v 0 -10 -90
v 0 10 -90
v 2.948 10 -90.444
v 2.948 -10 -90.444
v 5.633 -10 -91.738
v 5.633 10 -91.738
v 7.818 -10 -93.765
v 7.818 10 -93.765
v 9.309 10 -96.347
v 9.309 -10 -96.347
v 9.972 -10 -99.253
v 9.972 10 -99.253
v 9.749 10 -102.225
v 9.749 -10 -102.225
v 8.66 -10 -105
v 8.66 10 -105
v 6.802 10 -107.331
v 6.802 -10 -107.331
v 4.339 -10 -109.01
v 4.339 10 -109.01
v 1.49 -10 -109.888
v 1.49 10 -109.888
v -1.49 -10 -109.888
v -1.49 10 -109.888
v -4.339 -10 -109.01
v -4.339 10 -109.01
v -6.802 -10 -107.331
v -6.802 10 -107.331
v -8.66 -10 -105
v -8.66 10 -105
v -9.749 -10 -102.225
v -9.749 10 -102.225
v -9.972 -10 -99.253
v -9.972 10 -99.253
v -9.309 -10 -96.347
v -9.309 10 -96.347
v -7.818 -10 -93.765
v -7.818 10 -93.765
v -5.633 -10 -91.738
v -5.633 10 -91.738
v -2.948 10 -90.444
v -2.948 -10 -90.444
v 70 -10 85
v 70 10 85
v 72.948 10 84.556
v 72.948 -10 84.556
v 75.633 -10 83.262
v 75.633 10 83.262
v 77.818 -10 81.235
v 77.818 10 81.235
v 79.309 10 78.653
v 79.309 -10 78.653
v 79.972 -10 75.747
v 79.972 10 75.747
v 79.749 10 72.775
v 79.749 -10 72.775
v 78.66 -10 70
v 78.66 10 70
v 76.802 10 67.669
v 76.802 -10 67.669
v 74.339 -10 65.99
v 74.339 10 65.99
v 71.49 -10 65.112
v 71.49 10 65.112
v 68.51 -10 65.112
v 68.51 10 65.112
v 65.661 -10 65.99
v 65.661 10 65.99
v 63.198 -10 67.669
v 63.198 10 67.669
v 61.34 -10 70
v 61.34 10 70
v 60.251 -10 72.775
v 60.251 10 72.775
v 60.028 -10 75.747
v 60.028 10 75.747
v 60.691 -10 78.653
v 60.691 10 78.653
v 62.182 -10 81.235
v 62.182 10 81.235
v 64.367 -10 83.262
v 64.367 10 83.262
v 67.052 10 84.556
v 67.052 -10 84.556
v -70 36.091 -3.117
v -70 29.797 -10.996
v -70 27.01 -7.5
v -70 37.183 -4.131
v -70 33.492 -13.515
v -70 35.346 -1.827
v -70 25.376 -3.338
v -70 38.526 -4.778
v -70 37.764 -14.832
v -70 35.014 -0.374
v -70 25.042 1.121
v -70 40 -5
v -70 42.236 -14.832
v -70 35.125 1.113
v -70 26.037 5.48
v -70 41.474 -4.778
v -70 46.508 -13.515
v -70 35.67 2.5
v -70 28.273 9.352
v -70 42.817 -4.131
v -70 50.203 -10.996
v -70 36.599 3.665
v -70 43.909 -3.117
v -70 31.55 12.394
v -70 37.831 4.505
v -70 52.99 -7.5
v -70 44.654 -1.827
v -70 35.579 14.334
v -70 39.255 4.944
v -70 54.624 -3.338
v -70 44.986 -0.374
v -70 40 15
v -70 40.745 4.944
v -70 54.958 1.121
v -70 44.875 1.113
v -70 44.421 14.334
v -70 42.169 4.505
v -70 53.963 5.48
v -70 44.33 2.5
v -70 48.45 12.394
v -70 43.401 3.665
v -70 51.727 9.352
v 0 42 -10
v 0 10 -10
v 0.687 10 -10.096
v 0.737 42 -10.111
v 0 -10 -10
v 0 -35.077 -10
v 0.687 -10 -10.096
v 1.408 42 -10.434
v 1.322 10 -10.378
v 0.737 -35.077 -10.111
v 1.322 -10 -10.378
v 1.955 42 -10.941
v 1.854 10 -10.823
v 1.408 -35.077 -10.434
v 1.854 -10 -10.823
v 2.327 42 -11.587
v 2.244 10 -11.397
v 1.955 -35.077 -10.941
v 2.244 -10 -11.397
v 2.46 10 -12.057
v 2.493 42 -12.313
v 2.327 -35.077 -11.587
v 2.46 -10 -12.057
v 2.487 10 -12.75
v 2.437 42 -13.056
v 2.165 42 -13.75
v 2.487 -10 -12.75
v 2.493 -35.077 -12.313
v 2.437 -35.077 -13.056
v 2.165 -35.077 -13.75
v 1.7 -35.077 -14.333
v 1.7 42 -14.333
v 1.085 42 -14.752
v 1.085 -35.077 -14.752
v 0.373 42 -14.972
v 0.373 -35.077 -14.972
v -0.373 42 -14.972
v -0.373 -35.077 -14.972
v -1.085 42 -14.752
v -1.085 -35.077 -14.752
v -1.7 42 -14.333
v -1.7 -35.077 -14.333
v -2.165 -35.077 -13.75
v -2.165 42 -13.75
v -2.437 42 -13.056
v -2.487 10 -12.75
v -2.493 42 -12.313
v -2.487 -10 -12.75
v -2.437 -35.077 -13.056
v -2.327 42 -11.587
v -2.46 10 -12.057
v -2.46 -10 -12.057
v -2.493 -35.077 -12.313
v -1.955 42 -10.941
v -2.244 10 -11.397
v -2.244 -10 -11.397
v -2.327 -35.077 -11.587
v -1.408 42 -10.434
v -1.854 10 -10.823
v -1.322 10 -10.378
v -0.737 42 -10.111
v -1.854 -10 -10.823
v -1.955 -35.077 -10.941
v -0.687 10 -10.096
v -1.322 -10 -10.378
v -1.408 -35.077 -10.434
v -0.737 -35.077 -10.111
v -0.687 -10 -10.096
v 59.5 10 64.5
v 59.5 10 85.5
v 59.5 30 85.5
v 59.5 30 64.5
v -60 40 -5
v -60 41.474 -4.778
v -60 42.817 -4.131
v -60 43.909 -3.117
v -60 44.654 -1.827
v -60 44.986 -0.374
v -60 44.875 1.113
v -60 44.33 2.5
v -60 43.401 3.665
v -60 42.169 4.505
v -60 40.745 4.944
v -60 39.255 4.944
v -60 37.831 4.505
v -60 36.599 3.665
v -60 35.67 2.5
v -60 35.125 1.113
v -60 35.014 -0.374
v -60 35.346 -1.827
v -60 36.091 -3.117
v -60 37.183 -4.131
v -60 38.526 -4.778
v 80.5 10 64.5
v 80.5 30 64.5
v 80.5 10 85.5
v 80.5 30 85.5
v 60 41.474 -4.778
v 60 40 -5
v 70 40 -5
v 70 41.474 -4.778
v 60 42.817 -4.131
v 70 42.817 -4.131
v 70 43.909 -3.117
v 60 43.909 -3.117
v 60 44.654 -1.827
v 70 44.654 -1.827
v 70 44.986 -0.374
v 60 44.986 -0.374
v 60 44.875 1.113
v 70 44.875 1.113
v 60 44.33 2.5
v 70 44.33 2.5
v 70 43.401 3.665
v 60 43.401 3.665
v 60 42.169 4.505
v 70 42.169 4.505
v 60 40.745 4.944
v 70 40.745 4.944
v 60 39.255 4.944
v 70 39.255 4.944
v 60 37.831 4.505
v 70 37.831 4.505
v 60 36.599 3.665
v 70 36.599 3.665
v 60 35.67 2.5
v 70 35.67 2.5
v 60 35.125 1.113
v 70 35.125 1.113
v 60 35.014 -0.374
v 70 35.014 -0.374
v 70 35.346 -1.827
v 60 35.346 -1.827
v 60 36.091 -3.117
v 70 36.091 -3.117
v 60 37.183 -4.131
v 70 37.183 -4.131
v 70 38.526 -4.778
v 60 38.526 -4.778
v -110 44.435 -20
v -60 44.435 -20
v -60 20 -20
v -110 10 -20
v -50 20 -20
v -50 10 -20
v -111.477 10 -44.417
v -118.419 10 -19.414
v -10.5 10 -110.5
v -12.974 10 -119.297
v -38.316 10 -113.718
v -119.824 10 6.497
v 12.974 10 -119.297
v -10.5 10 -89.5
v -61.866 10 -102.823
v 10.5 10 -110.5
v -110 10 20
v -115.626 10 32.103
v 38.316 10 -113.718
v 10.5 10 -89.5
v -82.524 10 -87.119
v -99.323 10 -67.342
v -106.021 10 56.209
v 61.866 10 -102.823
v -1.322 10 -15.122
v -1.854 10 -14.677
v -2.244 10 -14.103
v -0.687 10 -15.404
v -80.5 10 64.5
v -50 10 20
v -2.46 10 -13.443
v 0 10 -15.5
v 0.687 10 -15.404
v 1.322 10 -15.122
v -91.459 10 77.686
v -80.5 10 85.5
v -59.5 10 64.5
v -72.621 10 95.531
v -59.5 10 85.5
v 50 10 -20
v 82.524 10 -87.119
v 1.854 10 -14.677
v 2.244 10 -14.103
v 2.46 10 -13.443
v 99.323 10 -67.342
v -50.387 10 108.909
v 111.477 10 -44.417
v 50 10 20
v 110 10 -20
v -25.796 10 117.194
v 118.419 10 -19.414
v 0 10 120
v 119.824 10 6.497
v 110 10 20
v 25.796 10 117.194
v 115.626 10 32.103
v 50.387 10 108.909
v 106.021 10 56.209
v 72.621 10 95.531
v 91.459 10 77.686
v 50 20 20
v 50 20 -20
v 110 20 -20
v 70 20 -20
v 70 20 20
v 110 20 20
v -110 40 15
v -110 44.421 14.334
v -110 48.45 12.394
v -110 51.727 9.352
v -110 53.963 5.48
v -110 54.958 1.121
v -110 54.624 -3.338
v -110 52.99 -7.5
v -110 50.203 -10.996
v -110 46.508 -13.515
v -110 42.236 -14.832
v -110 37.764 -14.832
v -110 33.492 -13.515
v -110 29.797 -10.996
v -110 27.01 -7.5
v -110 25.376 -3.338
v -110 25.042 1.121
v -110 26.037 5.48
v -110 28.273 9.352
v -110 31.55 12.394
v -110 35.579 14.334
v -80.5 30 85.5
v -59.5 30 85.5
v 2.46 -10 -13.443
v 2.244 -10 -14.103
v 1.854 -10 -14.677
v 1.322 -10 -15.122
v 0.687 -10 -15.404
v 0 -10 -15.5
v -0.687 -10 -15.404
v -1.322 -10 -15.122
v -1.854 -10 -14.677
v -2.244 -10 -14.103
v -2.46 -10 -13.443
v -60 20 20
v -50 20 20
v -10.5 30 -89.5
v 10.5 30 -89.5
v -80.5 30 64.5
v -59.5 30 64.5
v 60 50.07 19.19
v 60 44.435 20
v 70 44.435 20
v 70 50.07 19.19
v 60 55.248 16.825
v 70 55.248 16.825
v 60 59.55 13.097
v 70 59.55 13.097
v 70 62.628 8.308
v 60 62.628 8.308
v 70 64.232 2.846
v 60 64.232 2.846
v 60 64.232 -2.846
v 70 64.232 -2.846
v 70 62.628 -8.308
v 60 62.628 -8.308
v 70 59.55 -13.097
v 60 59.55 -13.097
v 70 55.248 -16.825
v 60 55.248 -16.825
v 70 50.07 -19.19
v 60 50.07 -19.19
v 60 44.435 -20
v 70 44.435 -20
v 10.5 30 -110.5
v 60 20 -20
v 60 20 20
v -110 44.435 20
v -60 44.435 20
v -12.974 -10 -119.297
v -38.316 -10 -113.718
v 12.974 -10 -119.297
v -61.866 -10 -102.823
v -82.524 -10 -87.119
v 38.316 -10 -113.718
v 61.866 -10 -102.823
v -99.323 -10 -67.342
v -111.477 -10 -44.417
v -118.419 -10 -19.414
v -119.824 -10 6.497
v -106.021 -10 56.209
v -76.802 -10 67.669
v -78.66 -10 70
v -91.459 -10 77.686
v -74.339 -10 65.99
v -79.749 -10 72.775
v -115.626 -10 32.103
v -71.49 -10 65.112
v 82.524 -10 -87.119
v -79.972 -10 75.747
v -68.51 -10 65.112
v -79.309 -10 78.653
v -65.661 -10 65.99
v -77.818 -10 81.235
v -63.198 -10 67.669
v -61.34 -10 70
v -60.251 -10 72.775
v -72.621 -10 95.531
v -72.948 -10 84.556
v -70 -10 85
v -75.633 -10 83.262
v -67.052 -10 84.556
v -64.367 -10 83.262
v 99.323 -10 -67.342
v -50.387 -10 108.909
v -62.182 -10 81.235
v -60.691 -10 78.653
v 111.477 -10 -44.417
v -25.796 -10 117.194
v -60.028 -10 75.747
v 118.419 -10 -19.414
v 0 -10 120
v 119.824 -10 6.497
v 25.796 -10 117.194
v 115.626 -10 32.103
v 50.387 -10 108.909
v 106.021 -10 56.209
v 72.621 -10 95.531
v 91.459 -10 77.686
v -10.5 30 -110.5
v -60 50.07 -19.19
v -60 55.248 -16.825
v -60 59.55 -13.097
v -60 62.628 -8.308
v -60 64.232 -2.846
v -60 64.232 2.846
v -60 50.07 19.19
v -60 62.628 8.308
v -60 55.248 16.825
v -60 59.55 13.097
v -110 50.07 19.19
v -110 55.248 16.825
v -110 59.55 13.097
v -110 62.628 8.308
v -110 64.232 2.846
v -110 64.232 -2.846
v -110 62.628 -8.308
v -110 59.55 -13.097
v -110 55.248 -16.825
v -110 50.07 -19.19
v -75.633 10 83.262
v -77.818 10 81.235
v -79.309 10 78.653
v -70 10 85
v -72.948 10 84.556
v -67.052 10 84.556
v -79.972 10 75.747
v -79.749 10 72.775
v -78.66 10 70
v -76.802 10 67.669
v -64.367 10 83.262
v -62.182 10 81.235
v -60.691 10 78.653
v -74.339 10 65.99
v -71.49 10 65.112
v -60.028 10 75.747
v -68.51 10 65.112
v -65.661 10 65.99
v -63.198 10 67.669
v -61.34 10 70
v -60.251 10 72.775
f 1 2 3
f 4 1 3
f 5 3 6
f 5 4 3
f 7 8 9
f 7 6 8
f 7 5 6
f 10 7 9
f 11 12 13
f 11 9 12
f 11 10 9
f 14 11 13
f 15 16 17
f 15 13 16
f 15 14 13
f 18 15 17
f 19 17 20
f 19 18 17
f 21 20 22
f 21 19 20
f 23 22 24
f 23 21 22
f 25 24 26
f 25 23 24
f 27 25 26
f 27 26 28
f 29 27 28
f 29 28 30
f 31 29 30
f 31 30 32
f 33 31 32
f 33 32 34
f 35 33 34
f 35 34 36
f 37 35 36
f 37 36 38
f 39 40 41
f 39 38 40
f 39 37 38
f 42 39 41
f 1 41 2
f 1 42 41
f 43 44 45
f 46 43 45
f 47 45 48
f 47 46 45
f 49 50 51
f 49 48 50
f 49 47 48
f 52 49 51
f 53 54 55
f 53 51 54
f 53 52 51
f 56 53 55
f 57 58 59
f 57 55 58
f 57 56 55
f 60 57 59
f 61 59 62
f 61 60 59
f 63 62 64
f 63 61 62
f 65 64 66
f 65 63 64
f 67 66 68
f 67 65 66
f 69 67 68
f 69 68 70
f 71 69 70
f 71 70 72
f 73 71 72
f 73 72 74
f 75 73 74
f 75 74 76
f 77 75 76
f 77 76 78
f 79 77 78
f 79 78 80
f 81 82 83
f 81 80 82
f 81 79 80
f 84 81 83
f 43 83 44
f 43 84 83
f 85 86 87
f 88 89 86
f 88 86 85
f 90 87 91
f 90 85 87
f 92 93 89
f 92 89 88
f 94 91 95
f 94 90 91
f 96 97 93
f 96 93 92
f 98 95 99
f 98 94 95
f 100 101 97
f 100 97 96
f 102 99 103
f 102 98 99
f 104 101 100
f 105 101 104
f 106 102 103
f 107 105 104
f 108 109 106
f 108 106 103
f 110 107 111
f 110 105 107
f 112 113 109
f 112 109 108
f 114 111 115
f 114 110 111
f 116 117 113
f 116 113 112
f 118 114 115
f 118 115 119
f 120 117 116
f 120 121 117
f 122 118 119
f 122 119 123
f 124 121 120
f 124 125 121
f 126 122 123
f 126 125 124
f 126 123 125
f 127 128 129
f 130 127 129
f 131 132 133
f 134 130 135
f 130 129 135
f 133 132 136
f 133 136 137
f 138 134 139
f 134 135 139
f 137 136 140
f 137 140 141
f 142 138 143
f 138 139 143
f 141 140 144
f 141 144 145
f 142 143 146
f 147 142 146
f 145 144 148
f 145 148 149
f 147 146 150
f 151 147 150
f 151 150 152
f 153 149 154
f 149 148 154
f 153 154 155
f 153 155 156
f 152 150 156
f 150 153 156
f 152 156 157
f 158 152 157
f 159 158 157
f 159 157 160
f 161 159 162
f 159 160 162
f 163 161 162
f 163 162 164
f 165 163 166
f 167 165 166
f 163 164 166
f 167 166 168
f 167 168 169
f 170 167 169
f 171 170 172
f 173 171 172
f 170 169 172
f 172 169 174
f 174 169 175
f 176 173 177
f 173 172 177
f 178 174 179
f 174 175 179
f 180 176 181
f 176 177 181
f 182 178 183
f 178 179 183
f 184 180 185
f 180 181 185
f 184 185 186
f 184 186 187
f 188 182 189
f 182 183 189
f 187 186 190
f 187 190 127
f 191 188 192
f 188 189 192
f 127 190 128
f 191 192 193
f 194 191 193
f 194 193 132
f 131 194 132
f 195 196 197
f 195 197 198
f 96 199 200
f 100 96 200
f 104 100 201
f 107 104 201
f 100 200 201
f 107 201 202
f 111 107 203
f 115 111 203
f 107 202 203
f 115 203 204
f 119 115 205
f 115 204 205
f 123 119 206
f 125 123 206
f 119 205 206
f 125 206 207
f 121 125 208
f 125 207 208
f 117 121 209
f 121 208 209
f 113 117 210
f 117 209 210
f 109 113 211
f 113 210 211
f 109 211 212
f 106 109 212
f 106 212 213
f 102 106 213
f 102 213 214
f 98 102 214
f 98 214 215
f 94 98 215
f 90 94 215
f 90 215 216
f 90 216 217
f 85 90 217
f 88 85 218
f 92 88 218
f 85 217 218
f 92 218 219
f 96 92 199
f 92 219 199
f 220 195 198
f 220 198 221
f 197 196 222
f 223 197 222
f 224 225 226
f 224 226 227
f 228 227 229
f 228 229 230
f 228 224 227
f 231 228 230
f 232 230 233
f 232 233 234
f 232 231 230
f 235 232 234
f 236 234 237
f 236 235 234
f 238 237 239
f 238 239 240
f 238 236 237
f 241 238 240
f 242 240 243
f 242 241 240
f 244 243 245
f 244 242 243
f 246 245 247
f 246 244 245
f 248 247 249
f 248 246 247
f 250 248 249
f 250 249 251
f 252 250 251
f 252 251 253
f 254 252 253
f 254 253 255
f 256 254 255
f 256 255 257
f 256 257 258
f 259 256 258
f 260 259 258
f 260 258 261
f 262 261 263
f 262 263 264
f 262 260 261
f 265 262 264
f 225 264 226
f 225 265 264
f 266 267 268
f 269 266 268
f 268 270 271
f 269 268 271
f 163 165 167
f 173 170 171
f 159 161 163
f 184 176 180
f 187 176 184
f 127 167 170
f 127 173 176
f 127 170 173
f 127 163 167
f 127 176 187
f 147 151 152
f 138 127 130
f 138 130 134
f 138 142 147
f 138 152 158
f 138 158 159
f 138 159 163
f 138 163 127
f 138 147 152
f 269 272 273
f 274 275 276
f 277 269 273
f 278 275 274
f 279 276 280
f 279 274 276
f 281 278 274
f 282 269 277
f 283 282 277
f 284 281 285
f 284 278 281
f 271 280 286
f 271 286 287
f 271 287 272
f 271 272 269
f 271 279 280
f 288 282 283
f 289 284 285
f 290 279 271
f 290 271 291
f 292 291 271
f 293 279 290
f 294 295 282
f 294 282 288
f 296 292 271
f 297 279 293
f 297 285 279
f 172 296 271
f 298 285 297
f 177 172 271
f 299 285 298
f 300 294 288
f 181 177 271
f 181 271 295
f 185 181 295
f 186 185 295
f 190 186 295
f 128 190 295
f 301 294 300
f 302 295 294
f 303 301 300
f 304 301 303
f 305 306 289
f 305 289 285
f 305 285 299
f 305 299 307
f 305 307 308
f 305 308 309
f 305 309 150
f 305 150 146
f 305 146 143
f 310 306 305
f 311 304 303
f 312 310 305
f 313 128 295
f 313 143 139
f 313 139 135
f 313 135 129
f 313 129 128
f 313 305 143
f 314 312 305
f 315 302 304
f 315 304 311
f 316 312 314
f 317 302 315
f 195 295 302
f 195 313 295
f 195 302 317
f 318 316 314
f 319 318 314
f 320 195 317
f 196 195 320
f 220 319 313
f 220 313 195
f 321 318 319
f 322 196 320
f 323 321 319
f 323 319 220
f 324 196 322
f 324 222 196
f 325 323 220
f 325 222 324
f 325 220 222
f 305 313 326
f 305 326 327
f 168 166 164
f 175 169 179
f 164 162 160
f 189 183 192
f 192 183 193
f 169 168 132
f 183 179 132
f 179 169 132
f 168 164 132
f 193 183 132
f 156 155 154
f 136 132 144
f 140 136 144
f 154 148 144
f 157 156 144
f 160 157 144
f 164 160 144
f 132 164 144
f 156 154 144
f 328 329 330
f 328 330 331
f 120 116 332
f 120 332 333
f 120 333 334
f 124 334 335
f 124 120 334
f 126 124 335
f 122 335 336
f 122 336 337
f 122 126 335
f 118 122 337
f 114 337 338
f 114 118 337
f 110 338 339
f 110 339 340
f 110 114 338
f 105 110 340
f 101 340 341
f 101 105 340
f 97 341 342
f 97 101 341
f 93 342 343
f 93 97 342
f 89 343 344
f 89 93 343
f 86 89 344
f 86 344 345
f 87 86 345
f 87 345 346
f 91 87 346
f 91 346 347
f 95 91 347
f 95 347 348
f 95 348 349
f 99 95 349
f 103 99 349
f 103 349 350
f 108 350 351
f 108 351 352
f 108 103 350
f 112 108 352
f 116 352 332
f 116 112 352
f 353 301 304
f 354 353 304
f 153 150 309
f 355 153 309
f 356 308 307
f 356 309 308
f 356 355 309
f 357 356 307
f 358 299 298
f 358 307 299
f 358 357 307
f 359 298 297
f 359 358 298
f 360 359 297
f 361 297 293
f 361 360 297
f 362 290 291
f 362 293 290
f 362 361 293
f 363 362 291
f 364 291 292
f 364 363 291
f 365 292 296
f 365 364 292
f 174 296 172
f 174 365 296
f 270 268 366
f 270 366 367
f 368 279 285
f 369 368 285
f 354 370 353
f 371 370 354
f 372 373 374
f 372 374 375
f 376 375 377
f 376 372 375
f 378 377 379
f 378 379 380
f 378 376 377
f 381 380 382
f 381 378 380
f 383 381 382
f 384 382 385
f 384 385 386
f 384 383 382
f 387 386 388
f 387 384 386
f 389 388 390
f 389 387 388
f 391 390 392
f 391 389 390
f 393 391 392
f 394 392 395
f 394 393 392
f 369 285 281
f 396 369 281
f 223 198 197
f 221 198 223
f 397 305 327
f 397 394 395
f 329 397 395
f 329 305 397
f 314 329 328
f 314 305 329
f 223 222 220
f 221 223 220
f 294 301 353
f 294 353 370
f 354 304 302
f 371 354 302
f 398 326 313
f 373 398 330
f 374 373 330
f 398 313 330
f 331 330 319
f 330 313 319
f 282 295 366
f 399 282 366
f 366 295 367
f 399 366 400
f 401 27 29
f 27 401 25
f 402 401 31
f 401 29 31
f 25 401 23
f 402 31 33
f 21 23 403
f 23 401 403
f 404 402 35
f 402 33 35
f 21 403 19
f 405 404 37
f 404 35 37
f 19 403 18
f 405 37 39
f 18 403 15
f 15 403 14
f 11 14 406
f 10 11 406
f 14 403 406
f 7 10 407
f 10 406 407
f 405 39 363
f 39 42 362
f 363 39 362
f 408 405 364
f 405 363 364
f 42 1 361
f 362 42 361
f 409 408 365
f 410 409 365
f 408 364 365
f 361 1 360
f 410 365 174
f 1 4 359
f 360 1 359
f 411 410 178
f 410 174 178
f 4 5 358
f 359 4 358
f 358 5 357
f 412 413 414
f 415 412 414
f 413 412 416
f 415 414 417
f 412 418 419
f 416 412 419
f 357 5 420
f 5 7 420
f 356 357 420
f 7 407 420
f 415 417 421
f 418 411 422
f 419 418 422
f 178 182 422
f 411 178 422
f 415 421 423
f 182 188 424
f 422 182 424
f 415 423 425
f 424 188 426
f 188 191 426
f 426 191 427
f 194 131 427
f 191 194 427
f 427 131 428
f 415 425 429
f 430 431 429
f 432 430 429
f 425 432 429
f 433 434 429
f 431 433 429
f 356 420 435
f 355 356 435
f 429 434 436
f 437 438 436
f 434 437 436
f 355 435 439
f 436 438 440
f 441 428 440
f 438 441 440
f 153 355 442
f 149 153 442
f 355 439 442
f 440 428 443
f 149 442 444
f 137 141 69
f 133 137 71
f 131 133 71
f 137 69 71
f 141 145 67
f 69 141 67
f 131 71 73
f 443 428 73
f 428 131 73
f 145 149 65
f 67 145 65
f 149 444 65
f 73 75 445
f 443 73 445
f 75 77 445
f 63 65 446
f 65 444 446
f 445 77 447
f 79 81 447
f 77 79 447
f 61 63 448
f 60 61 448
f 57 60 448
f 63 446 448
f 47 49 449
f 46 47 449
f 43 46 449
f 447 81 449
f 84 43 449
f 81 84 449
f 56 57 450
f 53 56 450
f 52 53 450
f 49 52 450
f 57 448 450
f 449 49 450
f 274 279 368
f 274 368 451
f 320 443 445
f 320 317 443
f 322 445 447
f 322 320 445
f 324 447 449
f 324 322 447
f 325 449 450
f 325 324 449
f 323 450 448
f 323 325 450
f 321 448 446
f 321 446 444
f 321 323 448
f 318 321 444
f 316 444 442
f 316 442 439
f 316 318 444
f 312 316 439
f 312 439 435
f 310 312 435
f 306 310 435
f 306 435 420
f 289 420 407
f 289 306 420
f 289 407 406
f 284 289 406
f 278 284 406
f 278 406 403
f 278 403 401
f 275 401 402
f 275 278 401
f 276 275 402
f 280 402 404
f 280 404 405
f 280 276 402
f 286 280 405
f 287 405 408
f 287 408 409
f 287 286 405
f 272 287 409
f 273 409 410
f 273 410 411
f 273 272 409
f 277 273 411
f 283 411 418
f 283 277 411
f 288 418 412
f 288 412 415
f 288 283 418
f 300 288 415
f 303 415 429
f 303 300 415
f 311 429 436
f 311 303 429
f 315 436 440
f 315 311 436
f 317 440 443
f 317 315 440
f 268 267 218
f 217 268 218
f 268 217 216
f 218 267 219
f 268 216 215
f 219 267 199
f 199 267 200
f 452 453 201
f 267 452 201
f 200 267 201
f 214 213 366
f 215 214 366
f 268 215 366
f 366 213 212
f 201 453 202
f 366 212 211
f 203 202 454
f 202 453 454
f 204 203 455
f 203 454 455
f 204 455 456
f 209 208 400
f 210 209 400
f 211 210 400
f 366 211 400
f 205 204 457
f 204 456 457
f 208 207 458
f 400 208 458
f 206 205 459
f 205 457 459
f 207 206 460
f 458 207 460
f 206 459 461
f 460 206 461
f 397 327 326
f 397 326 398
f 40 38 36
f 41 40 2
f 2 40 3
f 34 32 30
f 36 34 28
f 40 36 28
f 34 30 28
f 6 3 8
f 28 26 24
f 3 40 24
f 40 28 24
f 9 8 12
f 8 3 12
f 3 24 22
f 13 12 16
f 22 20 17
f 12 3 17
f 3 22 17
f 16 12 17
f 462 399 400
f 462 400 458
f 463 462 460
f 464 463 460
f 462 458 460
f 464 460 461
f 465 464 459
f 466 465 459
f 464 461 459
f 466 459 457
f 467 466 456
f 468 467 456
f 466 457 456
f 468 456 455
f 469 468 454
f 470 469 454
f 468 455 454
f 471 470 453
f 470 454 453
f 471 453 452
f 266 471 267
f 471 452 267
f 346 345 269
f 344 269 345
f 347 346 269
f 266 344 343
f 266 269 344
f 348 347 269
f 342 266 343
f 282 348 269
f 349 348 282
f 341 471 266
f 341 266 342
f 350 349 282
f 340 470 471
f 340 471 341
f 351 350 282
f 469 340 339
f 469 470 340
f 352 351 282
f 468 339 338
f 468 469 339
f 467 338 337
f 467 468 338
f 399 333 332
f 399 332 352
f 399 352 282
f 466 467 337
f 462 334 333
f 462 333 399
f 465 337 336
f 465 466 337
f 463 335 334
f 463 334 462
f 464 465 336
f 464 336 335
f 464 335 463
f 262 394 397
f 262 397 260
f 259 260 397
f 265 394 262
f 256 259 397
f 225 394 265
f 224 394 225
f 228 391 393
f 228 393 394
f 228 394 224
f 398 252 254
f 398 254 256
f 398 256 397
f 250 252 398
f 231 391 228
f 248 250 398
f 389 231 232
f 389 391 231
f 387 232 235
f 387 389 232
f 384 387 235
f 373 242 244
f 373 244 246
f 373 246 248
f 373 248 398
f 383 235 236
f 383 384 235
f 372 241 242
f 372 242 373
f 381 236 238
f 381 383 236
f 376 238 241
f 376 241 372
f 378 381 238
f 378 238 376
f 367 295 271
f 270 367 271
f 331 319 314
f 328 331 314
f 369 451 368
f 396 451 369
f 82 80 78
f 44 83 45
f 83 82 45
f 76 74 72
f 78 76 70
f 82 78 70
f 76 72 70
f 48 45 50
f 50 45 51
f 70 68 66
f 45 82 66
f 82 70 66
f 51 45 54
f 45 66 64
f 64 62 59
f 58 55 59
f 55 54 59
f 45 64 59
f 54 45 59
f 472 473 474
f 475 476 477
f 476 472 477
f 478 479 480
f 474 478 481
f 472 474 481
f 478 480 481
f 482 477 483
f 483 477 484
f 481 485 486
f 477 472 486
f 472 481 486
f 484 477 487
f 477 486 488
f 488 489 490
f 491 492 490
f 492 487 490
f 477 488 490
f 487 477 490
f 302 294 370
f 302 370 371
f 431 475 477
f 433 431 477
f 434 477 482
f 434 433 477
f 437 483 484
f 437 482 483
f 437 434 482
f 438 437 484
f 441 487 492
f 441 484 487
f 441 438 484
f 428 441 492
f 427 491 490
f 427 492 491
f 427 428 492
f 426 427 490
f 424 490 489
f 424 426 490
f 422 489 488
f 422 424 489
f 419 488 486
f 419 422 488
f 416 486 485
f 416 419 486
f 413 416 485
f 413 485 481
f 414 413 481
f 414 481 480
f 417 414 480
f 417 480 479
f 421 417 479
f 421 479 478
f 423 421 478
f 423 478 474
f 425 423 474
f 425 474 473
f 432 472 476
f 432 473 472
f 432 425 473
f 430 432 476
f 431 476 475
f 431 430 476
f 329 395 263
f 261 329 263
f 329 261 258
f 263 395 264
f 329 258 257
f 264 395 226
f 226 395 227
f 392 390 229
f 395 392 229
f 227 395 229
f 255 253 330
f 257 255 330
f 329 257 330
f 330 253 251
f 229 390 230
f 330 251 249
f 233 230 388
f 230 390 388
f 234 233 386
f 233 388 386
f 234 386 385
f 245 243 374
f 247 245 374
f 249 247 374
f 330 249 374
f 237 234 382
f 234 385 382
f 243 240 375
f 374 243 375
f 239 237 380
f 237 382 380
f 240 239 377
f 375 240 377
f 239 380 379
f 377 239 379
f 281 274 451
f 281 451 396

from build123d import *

# Parameters (mm, degrees)
SKETCH1_R                = 120
BOSS_EXTRUDE1_DEPTH      = 10
SKETCH2_W                = 60
SKETCH2_H                = 40
BOSS_EXTRUDE2_DEPTH      = 10
CUT_EXTRUDE1_DEPTH       = 171.880074906
CUT_EXTRUDE1_DEPTH_BACK  = 171.880074906
SKETCH3_R                = 2.5
SKETCH4_R                = 5
BOSS_EXTRUDE4_DEPTH      = 10
SKETCH5_R                = 15
BOSS_EXTRUDE5_DEPTH      = 40
CUT_EXTRUDE2_DEPTH       = 179.222286063
CUT_EXTRUDE2_DEPTH_BACK  = 179.222286063
SKETCH7_R                = 10
SKETCH8_W                = 21
SKETCH8_H                = 21
BOSS_EXTRUDE8_DEPTH      = 20
BOSS_EXTRUDE9_DEPTH      = 42
BOSS_EXTRUDE9_DEPTH_BACK = 35.076669
SKETCH9_R                = 2.5


with BuildPart() as part:
    # Sketch1 → Boss-Extrude1 (new, symmetric)
    with BuildSketch(Plane(origin=(0, 0, 0), x_dir=(1, 0, 0), z_dir=(0, 1, 0))):
        with Locations(Location((0, 0, 0), (0, 0, 270))):
            Circle(SKETCH1_R)
    extrude(amount=BOSS_EXTRUDE1_DEPTH, both=True)

    # Sketch2 → Boss-Extrude2 (add)
    with BuildSketch(Plane(origin=(0, 10, 0), x_dir=(1, 0, 0), z_dir=(0, 1, 0))):
        with Locations((-80, 0)):
            Rectangle(SKETCH2_W, SKETCH2_H)
        with Locations((80, 0)):
            Rectangle(SKETCH2_W, SKETCH2_H)
    extrude(amount=BOSS_EXTRUDE2_DEPTH)

    # Sketch3 → Cut-Extrude1 (cut, two sides: drawn at the far end of the back side and taken through both)
    with BuildSketch(Plane(origin=(0, 10, 0), x_dir=(1, 0, 0), z_dir=(0, 1, 0)).offset(-CUT_EXTRUDE1_DEPTH_BACK)):
        with Locations(Location((0, 13, 0), (0, 0, 270))):
            Circle(SKETCH3_R)
    extrude(amount=CUT_EXTRUDE1_DEPTH + CUT_EXTRUDE1_DEPTH_BACK, mode=Mode.SUBTRACT)

    # Sketch4 → Boss-Extrude4 (add)
    with BuildSketch(Plane(origin=(-60, 0, 0), x_dir=(0, 0, -1), z_dir=(1, 0, 0))):
        with BuildLine():
            ThreePointArc((-20, 44.435128818), (0, 64.435128818), (20, 44.435128818))
            Line((20, 44.435128818), (20, 20))
            Line((20, 20), (-20, 20))
            Line((-20, 20), (-20, 44.435128818))
        make_face()
        with Locations((0, 40)):
            Circle(SKETCH4_R, mode=Mode.SUBTRACT)
    boss_extrude4 = extrude(amount=-BOSS_EXTRUDE4_DEPTH)

    # Sketch5 → Boss-Extrude5 (add)
    with BuildSketch(Plane.ZY.offset(70)):
        with BuildLine():
            Line((-20, 20), (20, 20))
            Line((20, 20), (20, 44.435128818))
            ThreePointArc((20, 44.435128818), (0, 64.435128818), (-20, 44.435128818))
            Line((-20, 44.435128818), (-20, 20))
        make_face()
        with Locations((0, 40)):
            Circle(SKETCH5_R, mode=Mode.SUBTRACT)
    extrude(amount=BOSS_EXTRUDE5_DEPTH)

    # Mirror2: Boss-Extrude4 across plane
    add(boss_extrude4.mirror(Plane(origin=(0, 0, 0), x_dir=(0, 0, 1), z_dir=(1, 0, 0))))

    # Sketch7 → Cut-Extrude2 (cut, two sides: drawn at the far end of the back side and taken through both)
    with BuildSketch(Plane(origin=(0, 10, 0), x_dir=(1, 0, 0), z_dir=(0, 1, 0)).offset(-CUT_EXTRUDE2_DEPTH_BACK)):
        with Locations(Location((0, 100, 0), (0, 0, 270))):
            Circle(SKETCH7_R)
        with Locations(Location((-70, -75, 0), (0, 0, 270))):
            Circle(SKETCH7_R)
        with Locations(Location((70, -75, 0), (0, 0, 270))):
            Circle(SKETCH7_R)
    extrude(amount=CUT_EXTRUDE2_DEPTH + CUT_EXTRUDE2_DEPTH_BACK, mode=Mode.SUBTRACT)

    # Sketch8 → Boss-Extrude8 (add)
    with BuildSketch(Plane(origin=(0, 10, 0), x_dir=(1, 0, 0), z_dir=(0, 1, 0))):
        with Locations((-70, -75)):
            Rectangle(SKETCH8_W, SKETCH8_H)
        with Locations((0, 100)):
            Rectangle(SKETCH8_W, SKETCH8_H)
        with Locations((70, -75)):
            Rectangle(SKETCH8_W, SKETCH8_H)
    extrude(amount=BOSS_EXTRUDE8_DEPTH)

    # Sketch9 → Boss-Extrude9 (add, two sides: drawn at the far end of the back side and taken through both)
    with BuildSketch(Plane(origin=(0, 0, 0), x_dir=(1, 0, 0), z_dir=(0, 1, 0)).offset(-BOSS_EXTRUDE9_DEPTH_BACK)):
        with Locations(Location((0, 12.5, 0), (0, 0, 270))):
            Circle(SKETCH9_R)
    extrude(amount=BOSS_EXTRUDE9_DEPTH + BOSS_EXTRUDE9_DEPTH_BACK)


solid = part.part
